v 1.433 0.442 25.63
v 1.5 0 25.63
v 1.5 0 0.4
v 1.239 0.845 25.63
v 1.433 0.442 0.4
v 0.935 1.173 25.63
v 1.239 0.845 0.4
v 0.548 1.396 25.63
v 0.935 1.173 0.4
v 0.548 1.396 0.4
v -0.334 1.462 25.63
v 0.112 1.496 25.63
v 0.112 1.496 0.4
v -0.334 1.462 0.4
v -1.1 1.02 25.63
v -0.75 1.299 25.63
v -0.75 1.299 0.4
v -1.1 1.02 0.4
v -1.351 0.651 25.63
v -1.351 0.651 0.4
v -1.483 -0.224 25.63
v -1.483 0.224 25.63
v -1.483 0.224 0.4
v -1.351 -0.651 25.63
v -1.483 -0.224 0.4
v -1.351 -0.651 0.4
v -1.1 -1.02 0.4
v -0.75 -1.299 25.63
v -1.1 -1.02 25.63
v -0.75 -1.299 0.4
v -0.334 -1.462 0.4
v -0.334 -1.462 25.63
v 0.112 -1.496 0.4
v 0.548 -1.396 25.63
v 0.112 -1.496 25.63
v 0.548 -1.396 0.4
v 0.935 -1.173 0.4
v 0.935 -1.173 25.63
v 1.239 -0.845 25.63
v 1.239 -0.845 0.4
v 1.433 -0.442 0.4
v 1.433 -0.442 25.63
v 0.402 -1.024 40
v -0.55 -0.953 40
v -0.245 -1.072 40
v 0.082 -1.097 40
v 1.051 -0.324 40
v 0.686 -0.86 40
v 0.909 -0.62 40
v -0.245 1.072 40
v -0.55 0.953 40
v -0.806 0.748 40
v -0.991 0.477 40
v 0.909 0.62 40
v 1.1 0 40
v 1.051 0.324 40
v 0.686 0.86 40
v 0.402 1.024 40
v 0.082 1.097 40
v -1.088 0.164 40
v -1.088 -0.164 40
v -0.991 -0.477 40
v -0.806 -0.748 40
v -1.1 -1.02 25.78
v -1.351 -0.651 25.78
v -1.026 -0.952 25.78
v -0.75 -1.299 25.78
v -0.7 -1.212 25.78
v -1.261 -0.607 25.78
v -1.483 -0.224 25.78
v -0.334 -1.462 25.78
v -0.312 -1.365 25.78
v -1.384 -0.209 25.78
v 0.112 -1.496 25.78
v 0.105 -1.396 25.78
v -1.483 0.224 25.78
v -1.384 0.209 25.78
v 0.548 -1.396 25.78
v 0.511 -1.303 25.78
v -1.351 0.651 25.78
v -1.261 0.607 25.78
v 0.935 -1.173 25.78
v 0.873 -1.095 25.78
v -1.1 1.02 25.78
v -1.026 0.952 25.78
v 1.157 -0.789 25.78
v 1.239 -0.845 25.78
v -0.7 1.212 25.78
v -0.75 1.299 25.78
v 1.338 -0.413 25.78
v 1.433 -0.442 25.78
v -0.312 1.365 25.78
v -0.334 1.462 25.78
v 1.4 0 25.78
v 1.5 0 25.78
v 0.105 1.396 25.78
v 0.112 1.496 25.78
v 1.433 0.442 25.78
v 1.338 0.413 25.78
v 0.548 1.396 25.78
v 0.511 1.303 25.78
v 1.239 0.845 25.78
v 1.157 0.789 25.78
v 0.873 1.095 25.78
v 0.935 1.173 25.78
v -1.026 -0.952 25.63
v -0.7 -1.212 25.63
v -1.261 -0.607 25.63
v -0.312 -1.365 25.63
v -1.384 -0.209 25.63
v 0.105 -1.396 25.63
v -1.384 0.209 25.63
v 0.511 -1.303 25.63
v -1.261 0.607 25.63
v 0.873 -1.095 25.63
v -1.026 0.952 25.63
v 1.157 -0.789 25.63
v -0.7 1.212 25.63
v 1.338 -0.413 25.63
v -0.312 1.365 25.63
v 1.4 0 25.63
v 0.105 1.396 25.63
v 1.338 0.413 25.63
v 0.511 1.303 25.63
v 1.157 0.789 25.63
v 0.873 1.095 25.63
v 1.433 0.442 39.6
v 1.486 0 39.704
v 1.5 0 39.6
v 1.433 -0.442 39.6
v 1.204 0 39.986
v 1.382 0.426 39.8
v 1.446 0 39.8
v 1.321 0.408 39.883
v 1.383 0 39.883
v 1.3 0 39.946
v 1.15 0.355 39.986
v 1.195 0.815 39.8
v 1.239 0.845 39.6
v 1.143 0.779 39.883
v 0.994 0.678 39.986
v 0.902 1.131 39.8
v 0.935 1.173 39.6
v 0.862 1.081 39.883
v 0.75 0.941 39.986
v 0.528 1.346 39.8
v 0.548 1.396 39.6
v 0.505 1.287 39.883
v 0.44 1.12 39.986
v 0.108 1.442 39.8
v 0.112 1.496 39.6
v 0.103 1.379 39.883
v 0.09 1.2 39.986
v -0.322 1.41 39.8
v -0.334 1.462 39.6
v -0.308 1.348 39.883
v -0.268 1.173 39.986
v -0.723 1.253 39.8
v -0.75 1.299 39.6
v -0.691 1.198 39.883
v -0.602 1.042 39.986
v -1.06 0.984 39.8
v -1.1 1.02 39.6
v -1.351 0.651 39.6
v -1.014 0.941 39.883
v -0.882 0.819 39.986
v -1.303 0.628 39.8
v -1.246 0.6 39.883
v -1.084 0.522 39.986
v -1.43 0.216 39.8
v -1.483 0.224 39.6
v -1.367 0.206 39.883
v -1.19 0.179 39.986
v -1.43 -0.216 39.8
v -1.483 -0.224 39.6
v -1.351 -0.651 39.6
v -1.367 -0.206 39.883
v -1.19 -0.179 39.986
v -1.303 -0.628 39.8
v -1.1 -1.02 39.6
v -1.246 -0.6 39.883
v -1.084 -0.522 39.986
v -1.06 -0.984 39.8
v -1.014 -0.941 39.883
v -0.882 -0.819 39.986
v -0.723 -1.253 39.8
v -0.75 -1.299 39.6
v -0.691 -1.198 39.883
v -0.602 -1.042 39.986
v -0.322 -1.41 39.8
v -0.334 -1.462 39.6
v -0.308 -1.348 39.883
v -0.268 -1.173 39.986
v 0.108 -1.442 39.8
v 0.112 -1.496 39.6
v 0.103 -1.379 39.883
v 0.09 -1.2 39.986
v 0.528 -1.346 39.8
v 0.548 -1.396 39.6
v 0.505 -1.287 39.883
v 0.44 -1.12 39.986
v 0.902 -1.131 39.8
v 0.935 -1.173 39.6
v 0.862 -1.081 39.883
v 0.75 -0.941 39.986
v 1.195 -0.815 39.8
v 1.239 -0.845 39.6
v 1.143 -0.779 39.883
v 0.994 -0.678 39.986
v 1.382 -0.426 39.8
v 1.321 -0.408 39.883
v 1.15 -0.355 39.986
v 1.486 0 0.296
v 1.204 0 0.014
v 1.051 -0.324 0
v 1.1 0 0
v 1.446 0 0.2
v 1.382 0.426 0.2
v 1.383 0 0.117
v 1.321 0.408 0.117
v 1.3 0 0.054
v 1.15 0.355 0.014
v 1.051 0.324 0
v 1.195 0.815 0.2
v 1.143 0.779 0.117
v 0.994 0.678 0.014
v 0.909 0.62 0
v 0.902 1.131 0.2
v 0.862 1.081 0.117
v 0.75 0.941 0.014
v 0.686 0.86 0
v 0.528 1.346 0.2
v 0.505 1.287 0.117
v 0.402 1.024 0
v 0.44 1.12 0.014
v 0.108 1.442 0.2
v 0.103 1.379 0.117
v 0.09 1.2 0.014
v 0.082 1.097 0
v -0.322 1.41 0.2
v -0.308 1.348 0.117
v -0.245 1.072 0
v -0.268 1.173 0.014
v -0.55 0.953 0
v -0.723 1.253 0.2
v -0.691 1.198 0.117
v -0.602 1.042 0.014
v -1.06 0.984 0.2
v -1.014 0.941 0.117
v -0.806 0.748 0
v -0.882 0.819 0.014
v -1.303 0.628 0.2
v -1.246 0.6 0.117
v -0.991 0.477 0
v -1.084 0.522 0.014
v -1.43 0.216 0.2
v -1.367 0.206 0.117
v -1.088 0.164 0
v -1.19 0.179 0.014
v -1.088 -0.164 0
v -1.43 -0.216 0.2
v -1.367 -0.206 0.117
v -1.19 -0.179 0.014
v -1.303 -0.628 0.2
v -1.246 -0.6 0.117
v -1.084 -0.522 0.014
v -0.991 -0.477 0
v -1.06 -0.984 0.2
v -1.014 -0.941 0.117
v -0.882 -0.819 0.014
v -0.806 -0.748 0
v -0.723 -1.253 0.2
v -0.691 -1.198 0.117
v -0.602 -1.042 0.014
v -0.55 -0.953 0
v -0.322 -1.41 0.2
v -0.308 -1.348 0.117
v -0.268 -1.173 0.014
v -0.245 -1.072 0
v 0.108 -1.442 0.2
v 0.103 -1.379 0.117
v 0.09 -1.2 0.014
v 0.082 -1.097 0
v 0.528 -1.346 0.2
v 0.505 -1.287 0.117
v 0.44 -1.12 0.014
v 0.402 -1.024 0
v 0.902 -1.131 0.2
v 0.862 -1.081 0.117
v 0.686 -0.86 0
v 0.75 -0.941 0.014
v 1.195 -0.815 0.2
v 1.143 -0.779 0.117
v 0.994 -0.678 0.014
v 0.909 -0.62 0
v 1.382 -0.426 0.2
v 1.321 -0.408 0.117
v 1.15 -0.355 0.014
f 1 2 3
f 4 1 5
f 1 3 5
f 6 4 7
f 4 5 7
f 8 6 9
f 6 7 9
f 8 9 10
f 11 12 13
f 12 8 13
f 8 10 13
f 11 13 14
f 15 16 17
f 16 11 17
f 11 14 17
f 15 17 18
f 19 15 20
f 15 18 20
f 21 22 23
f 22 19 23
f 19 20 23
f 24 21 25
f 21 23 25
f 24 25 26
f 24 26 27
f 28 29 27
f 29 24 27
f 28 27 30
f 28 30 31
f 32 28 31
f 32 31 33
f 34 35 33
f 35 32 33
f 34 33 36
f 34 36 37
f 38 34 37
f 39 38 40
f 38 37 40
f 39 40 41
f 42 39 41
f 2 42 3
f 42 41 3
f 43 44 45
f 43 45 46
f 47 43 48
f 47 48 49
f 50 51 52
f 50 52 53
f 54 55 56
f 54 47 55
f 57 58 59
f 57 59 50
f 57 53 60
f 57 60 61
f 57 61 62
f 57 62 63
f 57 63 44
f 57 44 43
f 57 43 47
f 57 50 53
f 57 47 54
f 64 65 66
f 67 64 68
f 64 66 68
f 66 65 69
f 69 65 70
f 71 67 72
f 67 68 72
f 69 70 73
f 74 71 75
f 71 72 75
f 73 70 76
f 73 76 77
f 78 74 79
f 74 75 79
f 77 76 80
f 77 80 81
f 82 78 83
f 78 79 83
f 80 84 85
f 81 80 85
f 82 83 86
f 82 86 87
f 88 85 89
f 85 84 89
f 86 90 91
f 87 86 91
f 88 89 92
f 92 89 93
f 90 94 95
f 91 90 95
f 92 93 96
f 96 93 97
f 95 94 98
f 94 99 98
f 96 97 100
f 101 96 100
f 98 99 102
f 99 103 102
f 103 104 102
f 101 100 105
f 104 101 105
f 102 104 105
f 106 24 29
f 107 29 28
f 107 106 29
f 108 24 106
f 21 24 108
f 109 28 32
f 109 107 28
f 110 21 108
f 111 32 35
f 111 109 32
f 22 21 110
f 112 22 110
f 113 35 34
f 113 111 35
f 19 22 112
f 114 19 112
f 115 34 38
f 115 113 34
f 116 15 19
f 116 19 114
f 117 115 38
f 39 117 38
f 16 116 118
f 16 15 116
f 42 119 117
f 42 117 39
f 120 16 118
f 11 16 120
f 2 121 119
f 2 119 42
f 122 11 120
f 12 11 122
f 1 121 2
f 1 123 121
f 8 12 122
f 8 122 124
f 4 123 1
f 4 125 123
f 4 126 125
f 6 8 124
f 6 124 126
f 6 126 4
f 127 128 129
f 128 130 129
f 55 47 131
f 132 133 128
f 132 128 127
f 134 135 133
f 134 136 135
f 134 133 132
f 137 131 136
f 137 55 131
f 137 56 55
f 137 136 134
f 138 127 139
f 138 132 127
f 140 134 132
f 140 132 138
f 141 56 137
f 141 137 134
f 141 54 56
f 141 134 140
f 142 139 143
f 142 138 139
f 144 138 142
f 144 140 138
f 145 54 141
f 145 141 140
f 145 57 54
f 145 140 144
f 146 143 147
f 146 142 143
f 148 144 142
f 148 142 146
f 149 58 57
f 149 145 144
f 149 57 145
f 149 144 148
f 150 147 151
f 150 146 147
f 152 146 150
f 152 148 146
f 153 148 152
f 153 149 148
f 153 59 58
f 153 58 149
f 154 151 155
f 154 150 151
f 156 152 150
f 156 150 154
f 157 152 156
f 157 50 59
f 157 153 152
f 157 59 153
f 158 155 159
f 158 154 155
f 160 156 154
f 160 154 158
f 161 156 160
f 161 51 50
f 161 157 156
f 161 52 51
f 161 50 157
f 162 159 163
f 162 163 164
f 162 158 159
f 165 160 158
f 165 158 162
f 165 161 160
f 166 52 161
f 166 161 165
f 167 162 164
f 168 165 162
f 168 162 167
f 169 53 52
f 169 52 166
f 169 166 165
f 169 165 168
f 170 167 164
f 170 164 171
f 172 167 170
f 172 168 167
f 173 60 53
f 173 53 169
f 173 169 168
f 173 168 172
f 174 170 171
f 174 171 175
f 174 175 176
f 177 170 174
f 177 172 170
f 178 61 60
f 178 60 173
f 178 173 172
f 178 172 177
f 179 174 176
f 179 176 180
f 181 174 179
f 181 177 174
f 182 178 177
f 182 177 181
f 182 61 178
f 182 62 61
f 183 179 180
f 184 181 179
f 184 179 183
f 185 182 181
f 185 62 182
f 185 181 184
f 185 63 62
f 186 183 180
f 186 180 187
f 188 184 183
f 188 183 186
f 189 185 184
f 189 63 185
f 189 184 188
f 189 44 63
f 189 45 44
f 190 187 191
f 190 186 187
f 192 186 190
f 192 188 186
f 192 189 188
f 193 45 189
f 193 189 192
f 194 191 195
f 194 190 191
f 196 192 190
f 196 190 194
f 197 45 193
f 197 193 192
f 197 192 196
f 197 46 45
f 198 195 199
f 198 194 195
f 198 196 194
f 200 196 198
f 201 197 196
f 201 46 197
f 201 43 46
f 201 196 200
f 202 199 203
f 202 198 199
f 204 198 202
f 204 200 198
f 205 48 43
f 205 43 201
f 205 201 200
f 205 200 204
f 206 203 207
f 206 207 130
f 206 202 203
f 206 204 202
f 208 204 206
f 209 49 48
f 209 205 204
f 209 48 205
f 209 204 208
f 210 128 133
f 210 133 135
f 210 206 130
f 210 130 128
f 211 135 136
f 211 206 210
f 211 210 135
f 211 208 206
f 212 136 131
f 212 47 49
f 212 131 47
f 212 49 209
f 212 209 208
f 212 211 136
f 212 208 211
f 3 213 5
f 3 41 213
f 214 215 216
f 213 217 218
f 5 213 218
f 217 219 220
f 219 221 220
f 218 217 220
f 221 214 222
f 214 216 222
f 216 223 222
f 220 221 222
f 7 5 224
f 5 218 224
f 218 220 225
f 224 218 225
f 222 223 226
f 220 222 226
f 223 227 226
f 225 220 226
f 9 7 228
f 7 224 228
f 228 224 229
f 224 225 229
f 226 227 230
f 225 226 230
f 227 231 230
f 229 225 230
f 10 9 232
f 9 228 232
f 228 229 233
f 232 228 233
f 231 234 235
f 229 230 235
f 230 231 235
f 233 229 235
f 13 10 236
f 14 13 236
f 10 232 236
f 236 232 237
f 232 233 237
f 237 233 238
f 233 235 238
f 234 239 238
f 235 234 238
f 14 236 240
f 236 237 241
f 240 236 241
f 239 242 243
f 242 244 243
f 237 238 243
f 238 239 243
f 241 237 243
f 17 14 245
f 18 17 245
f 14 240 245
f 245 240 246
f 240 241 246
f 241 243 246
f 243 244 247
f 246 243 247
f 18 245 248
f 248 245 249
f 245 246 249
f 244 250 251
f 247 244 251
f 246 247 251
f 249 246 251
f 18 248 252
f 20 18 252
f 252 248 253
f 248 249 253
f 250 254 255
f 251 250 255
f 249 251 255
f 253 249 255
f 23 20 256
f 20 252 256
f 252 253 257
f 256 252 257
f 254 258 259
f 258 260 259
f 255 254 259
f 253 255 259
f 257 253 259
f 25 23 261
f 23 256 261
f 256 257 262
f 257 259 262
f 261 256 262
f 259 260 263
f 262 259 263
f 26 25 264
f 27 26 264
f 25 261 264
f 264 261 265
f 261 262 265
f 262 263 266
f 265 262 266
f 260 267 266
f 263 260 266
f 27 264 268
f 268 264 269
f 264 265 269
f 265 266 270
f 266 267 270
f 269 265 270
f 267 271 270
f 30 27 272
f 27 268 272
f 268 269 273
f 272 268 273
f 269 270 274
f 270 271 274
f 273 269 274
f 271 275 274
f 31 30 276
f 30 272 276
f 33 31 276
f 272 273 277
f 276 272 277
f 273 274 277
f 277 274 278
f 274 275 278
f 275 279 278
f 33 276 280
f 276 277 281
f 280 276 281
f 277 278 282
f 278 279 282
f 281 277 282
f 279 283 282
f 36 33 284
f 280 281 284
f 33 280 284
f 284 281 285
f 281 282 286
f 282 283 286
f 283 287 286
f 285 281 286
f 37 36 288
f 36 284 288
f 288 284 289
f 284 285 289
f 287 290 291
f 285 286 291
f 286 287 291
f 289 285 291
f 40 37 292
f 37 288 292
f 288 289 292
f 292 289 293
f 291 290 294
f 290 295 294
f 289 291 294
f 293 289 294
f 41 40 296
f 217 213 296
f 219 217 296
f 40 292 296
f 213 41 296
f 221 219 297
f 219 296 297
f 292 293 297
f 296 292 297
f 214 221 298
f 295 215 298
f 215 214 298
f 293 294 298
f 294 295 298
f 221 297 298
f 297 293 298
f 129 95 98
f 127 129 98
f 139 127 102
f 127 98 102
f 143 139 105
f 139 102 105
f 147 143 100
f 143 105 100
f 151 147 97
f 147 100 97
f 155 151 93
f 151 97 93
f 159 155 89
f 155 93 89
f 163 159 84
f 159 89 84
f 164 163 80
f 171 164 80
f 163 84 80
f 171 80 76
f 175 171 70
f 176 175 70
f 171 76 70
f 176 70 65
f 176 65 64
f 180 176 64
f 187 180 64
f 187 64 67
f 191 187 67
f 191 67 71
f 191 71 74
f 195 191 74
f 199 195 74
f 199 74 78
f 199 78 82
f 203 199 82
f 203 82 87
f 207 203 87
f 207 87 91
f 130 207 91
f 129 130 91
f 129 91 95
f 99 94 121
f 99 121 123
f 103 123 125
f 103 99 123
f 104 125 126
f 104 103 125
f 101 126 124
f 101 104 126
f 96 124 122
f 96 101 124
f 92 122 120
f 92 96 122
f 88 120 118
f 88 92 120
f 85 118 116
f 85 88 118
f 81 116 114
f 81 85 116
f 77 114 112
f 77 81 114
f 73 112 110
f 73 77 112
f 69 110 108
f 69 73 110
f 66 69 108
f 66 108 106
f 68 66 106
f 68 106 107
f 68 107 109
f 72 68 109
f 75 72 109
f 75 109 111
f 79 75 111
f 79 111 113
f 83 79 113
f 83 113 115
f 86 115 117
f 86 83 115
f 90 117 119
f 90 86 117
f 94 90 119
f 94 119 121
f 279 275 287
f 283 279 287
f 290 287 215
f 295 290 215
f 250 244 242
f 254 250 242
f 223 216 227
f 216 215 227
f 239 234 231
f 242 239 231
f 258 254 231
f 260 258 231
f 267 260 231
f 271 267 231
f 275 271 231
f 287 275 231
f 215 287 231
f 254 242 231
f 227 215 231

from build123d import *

# Parameters (mm, degrees)
SKETCH1_R           = 1.5
BOSS_EXTRUDE1_DEPTH = 40
FILLET1_R           = 0.4
SKETCH2_R           = 2.972656176
SKETCH2_R_2         = 1.4
CUT_EXTRUDE1_DEPTH  = 0.15


with BuildPart() as part:
    # Sketch1 → Boss-Extrude1 (new body)
    with BuildSketch(Plane.XY):
        Circle(SKETCH1_R)
    extrude(amount=BOSS_EXTRUDE1_DEPTH)

    # Fillet1
    fillet1_edges = [part.edges().sort_by_distance(p)[0] for p in [
        (-1.5, 0, 0),
        (-1.5, 0, 40),
    ]]
    fillet(fillet1_edges, radius=FILLET1_R)

    # Sketch2 → Cut-Extrude1 (cut)
    with BuildSketch(Plane.XY.offset(25.78)):
        Circle(SKETCH2_R)
        Circle(SKETCH2_R_2, mode=Mode.SUBTRACT)
    extrude(amount=-CUT_EXTRUDE1_DEPTH, mode=Mode.SUBTRACT)


solid = part.part
